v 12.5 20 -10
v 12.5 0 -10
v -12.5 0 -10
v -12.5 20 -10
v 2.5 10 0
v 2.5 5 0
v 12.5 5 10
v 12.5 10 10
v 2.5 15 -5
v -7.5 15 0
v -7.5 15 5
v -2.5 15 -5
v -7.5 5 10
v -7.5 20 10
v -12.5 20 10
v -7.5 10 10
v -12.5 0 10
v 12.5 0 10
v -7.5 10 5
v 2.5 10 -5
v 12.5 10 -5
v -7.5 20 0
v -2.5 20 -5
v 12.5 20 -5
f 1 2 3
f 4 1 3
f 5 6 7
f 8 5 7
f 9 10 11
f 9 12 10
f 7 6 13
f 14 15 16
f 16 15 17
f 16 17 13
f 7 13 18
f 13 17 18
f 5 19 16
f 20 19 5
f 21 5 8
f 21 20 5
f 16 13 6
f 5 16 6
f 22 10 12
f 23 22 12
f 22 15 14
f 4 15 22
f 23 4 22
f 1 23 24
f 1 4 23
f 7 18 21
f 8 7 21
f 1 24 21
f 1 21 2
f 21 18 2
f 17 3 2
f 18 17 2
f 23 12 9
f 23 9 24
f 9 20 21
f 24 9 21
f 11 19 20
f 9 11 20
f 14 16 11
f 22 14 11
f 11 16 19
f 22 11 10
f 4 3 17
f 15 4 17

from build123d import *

# Parameters (mm, degrees)
EXTRUDE_2_DEPTH = 20
EXTRUDE_3_DEPTH = 15
EXTRUDE_4_DEPTH = 10
EXTRUDE_5_DEPTH = 5


with BuildPart() as part:
    # 草圖1 → 填料-伸長2 (new body)
    with BuildSketch(Plane(origin=(0, 0, 0), x_dir=(1, 0, 0), z_dir=(0, 1, 0))):
        Polygon((-12.5, -10), (-7.5, -10), (-7.5, 0), (-2.5, 5), (12.5, 5), (12.5, 10), (-12.5, 10), align=None)
    extrude(amount=EXTRUDE_2_DEPTH)

    # 草圖1<4> → 填料-伸長3 (add)
    with BuildSketch(Plane(origin=(0, 0, 0), x_dir=(1, 0, 0), z_dir=(0, 1, 0))):
        Polygon((-7.5, 0), (-7.5, -5), (2.5, 5), (-2.5, 5), align=None)
    extrude(amount=EXTRUDE_3_DEPTH)

    # 草圖1<5> → 填料-伸長4 (add)
    with BuildSketch(Plane(origin=(0, 0, 0), x_dir=(1, 0, 0), z_dir=(0, 1, 0))):
        Polygon((-7.5, -5), (-7.5, -10), (2.5, 0), (12.5, -10), (12.5, 5), (2.5, 5), align=None)
    extrude(amount=EXTRUDE_4_DEPTH)

    # 草圖1<6> → 填料-伸長5 (add)
    with BuildSketch(Plane(origin=(0, 0, 0), x_dir=(1, 0, 0), z_dir=(0, 1, 0))):
        Polygon((2.5, 0), (-7.5, -10), (12.5, -10), align=None)
    extrude(amount=EXTRUDE_5_DEPTH)


solid = part.part
